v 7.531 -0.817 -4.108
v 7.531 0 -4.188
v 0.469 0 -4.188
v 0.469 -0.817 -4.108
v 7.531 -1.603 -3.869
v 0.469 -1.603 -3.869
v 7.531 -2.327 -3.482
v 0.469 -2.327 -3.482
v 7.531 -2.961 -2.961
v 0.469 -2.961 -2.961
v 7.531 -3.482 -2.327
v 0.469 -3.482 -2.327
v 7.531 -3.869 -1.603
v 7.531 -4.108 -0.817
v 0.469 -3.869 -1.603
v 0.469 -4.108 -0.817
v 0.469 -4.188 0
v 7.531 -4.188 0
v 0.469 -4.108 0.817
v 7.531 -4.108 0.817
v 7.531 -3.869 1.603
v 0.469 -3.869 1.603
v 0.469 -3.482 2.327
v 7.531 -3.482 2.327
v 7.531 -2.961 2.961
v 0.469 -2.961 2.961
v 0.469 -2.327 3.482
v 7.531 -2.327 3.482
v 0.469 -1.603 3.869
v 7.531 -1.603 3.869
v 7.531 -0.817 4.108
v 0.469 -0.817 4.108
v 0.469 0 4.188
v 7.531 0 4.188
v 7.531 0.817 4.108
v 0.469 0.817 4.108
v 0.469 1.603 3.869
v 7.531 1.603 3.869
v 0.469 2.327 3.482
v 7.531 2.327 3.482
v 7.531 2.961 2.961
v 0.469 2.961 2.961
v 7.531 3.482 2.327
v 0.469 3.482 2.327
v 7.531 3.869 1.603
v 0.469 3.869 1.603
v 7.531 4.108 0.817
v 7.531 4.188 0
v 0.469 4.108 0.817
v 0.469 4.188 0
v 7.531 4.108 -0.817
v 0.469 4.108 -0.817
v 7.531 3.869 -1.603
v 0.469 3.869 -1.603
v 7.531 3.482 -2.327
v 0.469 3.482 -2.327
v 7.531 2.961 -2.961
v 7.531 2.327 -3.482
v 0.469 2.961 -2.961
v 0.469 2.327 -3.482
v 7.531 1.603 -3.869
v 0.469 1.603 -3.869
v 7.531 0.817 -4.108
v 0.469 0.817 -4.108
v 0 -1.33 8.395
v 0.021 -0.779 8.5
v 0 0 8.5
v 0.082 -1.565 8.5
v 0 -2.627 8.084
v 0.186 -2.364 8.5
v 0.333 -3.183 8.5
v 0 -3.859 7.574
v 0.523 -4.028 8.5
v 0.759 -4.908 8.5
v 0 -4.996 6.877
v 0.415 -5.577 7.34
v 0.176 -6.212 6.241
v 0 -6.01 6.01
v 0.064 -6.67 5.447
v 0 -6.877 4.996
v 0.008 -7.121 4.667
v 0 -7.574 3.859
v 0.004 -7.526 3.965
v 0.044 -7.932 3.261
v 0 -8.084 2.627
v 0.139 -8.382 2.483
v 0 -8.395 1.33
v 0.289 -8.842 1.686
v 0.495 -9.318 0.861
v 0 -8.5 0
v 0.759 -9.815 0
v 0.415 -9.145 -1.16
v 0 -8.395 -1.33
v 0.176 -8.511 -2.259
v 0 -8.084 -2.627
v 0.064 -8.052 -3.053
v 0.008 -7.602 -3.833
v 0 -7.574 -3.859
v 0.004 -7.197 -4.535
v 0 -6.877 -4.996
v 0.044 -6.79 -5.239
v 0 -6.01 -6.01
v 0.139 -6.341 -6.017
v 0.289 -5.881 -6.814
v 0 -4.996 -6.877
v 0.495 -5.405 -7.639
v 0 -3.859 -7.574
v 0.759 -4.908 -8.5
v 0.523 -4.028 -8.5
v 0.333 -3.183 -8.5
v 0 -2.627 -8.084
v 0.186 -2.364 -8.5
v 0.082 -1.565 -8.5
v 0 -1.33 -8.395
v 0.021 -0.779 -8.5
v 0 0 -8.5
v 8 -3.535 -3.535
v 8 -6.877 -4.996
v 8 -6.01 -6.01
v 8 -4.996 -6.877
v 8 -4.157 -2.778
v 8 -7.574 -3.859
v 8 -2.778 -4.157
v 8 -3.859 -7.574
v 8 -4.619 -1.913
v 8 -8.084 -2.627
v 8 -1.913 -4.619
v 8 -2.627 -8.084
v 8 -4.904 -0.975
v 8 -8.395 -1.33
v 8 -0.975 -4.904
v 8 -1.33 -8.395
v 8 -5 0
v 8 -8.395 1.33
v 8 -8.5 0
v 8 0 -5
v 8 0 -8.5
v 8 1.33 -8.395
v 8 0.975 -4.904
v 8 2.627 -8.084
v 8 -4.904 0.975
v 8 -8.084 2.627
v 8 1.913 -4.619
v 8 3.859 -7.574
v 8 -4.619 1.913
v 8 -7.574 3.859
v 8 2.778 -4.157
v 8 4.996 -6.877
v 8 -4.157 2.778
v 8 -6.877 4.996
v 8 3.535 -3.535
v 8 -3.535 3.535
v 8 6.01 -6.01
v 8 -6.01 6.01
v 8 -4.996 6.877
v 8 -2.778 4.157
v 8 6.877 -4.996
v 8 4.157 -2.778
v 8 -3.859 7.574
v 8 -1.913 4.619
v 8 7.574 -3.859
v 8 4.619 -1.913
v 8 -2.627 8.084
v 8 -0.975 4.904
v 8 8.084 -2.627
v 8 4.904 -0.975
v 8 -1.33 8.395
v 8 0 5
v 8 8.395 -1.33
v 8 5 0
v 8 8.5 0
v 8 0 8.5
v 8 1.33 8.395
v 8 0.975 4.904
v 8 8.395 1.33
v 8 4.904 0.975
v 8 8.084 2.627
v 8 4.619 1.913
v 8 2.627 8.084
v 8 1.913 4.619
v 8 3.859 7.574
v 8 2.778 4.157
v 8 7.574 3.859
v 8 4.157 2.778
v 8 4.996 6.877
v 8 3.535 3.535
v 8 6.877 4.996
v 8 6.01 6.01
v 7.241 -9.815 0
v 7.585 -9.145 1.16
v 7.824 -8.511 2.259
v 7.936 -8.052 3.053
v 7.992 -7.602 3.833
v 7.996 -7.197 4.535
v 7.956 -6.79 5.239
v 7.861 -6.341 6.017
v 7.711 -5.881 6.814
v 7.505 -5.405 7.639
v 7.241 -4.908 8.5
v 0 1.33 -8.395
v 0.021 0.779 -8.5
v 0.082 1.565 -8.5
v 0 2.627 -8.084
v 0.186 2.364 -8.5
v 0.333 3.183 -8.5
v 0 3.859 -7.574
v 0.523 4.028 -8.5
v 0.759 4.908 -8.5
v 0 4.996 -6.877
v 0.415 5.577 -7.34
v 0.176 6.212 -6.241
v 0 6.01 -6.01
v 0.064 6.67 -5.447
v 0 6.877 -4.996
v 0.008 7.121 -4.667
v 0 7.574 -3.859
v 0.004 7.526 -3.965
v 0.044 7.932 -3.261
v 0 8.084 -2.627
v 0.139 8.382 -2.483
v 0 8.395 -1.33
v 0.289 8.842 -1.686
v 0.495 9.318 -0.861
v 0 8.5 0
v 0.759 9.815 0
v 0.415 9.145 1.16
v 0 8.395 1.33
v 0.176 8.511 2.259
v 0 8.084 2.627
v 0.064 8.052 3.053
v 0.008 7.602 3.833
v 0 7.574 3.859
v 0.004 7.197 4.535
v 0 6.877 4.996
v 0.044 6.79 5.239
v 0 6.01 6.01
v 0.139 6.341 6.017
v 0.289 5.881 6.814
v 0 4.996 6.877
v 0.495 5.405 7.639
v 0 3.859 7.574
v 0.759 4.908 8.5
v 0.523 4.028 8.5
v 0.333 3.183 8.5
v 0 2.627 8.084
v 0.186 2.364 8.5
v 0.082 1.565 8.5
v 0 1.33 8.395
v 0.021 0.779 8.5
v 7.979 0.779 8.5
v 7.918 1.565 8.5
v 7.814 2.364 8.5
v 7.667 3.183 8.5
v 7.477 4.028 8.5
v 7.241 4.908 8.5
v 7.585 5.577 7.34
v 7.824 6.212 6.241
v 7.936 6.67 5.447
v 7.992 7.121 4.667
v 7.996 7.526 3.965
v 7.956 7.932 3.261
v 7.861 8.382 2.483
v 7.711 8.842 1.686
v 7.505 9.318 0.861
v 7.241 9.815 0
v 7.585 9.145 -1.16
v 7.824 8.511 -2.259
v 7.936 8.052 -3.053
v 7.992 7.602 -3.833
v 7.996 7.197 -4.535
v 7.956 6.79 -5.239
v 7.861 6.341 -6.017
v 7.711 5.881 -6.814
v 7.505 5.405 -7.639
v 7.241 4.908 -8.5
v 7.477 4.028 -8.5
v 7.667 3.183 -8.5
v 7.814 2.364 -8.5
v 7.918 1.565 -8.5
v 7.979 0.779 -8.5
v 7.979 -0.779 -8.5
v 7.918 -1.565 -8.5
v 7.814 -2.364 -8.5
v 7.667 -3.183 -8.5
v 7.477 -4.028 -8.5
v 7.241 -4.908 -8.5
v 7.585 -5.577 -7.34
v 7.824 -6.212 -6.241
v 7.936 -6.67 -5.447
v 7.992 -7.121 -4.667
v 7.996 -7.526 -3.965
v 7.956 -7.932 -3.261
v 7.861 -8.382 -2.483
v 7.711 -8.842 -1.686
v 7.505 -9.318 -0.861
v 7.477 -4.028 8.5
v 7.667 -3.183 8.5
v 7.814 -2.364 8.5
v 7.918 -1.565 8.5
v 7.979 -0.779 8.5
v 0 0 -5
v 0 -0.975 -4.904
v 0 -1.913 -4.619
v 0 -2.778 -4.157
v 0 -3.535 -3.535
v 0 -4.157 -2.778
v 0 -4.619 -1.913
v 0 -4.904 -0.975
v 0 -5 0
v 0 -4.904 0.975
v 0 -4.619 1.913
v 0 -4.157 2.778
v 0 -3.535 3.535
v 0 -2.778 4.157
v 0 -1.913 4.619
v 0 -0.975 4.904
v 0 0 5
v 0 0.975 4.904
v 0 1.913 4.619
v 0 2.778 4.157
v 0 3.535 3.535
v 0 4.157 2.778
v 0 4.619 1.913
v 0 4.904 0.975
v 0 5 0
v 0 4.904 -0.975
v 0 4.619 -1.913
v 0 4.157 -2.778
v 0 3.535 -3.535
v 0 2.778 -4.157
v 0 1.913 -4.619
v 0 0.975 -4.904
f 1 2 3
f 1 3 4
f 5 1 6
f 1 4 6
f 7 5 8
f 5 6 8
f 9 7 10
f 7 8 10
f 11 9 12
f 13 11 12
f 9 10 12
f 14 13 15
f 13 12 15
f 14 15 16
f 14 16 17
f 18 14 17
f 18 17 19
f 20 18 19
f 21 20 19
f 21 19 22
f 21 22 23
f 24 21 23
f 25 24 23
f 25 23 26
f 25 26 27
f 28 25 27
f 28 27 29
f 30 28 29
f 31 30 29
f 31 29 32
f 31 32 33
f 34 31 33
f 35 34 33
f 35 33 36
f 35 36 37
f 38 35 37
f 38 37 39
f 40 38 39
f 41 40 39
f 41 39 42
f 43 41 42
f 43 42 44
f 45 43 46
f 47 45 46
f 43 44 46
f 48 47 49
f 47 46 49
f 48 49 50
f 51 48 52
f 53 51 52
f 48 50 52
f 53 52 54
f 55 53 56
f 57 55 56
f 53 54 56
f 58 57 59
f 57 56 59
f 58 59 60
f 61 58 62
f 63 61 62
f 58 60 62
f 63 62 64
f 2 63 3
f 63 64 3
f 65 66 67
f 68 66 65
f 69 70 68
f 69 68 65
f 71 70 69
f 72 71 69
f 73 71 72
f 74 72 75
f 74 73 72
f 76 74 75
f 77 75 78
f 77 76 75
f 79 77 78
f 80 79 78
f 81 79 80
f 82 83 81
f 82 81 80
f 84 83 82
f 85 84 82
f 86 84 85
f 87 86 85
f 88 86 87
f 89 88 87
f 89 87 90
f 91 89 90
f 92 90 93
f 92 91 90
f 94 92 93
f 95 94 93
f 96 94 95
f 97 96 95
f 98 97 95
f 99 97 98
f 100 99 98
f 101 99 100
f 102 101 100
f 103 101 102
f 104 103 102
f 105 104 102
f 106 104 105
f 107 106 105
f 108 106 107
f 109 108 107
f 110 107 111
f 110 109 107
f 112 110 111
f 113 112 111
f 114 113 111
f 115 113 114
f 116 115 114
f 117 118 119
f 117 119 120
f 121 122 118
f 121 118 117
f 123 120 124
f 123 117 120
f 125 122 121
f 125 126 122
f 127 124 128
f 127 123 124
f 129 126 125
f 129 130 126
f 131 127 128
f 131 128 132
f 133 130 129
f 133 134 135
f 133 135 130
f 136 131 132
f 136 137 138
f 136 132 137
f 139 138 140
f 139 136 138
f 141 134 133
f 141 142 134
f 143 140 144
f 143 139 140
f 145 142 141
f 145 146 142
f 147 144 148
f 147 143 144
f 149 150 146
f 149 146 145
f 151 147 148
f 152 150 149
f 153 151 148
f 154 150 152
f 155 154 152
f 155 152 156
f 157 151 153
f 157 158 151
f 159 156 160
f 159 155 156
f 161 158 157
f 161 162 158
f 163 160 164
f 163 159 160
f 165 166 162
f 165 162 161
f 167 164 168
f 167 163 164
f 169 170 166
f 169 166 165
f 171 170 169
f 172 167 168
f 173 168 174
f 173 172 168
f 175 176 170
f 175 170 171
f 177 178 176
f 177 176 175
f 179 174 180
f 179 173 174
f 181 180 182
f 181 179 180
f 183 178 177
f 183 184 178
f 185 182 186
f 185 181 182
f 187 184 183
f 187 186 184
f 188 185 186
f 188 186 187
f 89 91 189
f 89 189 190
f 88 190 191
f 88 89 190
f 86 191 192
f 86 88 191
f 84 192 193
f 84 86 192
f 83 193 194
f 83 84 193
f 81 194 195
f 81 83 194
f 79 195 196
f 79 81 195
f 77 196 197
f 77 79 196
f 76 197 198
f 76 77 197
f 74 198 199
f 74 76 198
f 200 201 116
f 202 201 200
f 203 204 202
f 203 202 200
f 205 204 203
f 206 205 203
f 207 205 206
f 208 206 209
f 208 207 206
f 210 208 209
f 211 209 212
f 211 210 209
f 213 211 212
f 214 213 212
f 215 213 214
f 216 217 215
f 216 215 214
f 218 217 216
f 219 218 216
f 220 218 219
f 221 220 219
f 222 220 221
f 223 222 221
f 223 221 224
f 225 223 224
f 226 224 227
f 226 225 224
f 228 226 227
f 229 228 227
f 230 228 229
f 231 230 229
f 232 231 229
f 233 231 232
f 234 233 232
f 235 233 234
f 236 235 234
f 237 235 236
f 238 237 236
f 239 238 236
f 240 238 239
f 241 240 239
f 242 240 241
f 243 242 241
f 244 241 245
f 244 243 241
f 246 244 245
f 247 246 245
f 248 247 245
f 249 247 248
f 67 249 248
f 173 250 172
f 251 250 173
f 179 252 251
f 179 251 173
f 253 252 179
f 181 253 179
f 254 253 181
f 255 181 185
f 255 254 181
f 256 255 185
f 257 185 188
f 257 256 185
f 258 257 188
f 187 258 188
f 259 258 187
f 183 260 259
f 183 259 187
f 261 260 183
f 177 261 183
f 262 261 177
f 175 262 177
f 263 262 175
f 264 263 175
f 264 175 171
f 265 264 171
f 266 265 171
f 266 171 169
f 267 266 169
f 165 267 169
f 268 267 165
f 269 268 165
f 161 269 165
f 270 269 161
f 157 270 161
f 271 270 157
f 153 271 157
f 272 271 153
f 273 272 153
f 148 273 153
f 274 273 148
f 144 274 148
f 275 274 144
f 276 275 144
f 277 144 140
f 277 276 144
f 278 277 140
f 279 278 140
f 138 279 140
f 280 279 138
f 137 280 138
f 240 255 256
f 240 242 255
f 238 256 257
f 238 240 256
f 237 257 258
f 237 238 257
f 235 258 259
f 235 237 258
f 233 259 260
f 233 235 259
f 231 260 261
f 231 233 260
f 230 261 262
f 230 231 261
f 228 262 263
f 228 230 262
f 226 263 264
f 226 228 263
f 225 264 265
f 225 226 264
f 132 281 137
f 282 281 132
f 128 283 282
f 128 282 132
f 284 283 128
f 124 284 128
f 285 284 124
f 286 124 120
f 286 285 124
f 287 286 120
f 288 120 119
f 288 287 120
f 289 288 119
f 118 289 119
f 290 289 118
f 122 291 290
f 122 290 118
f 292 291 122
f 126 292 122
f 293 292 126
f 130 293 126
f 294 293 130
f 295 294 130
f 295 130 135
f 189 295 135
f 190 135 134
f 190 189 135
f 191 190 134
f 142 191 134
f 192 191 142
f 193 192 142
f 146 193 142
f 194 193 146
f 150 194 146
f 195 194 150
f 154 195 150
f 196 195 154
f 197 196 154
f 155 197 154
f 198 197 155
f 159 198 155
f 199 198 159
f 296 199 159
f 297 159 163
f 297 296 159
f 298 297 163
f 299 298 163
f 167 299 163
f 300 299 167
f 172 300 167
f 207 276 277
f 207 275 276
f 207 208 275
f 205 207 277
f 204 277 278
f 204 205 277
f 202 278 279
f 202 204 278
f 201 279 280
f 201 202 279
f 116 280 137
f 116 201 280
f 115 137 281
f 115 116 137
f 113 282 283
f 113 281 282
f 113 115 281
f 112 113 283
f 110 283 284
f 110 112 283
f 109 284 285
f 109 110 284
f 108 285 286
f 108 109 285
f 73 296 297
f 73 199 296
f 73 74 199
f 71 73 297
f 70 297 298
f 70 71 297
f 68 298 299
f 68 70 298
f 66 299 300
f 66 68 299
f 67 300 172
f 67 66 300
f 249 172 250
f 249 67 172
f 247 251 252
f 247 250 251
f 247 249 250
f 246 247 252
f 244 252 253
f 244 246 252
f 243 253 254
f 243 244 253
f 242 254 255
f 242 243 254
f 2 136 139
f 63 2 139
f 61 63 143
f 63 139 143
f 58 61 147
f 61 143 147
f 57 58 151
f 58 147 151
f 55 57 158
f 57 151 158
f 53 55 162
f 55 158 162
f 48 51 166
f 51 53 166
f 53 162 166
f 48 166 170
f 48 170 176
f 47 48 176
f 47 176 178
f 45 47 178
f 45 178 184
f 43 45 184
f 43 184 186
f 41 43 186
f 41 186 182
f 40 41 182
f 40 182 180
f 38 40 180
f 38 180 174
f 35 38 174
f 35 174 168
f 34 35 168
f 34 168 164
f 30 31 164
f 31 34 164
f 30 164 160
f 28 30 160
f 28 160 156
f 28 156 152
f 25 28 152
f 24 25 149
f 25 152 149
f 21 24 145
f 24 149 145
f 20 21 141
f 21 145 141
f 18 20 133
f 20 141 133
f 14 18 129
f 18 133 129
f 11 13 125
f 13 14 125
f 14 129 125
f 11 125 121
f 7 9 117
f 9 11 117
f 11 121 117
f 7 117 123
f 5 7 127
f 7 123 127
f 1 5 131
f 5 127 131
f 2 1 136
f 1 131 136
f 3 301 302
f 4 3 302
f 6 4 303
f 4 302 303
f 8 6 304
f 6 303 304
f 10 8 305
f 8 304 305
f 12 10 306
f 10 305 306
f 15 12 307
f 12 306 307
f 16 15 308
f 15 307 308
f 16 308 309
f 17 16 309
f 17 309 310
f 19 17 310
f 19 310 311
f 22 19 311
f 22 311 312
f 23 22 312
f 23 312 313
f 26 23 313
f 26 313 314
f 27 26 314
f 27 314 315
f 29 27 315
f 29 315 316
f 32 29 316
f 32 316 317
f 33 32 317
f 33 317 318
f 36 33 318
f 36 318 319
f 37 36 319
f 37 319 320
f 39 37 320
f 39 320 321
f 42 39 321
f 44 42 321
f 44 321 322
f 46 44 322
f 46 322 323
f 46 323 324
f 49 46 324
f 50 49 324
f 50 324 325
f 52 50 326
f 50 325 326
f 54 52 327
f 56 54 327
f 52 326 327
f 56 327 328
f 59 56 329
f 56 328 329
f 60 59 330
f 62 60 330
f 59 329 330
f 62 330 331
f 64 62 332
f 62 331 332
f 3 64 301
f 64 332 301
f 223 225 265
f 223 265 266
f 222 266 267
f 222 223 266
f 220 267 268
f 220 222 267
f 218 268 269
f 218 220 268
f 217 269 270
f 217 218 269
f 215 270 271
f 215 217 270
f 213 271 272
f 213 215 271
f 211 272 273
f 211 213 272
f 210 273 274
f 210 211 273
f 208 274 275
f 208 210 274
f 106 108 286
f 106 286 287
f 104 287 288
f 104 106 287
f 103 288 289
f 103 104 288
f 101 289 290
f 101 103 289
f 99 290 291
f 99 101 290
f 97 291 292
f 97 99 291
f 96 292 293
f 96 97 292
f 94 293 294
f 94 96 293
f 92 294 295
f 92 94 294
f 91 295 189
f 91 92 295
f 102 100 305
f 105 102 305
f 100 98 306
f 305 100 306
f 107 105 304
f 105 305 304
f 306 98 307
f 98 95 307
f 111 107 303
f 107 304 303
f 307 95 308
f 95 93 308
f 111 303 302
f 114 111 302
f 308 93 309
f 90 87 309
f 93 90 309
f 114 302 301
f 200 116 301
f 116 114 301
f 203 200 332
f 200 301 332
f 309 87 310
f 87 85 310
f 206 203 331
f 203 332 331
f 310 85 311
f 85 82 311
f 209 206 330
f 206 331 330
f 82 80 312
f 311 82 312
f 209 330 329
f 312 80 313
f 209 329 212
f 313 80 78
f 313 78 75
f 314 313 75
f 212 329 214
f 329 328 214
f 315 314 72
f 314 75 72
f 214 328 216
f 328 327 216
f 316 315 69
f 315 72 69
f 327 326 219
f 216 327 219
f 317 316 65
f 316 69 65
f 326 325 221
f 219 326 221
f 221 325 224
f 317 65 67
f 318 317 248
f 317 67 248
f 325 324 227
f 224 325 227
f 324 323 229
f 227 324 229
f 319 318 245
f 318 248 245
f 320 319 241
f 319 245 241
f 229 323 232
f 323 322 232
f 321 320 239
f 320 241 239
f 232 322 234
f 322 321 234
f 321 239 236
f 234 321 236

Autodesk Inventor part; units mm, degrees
ref_plane "YZ Plane" through (0, 0, 0) normal (1, 0, 0) x (0, 1, 0)
ref_plane "XZ Plane" through (0, 0, 0) normal (0, 1, 0) x (-1, 0, 0)
sketch "Эскиз1" plane through (0, 0, 0) normal (1, 0, 0) x (0, 1, 0)
  line L0 (-9.815, 0) -> (-4.9075, 8.5)
  line L1 (-4.9075, 8.5) -> (4.9075, 8.5)
  line L2 (4.9075, 8.5) -> (9.815, 0)
  line L3 (9.815, 0) -> (4.9075, -8.5)
  line L4 (4.9075, -8.5) -> (-4.9075, -8.5)
  line L5 (-4.9075, -8.5) -> (-9.815, 0)
  point P0 (0, 0)
  point P1 (0, 0)
  dimension "d0" = 19.6299
extrude "Базовый элемент" add sketch "Эскиз1" along normal blind 8
sketch "Эскиз2" plane through (0, 0, 0) normal (0, 0, 1) x (1, 0, 0)
  line L0 (0, 4.9075) -> (0, 9.815) projected
  line L1 (0, 9.815) -> (8, 9.815) projected
  line L2 (8, 4.9075) -> (8, 9.815) projected
  line L3 (-1.6, 0) -> (9.6, 0) projected
  line L4 (0.7592, 9.815) -> (0, 8.5)
  line L5 (7.2408, 9.815) -> (8, 8.5)
  dimension "d3" = 30
  dimension "d4" = 30
  dimension "d5" = 17
  dimension "d6" = 17
revolve "Фаска1" cut sketch "Эскиз2" angle 360 about axis through (-10, 0, 0) along (1, 0, 0)
sketch "Эскиз3" plane through (8, 0, 0) normal (1, 0, 0) x (0, 0, -1)
  arc A0 (-4.25, -7.3612) -> (4.25, -7.3612) centre (0, 0) ccw projected
hole "Резьба" at (8, 0, 0) direction (-1, 0, 0) diameter 8.376 end through all thread size "M10x1.5" class "6H" standard "ISO Metric profile"
chamfer "Фаска2" distance 0.8119 angle 30 1 edges at (8, 0, 4.188) measured on face at (8, 7.0214, -0.1683)
chamfer "Фаска3" distance 0.8119 angle 30 1 edges at (0, 0, 4.188) measured on face at (0, 7.0214, -0.1683)
ref_plane "Work Plane1" through (-19.1723, 0, 0) normal (0, -0.866, -0.5) x (1, 0, 0)
equation "\"d0\" = 1.1547 * SW"
equation "\"d1\" = KOH"
equation "\"d3\" = ANG1"
equation "\"d4\" = ANG2"
equation "\"d5\" = SW0"
equation "\"d6\" = SW01"
equation "\"d8\" = -0.5 * GD1 + 0.5 * NND"
equation "\"d40\" = -0.5 * GD1 + 0.5 * NND"
equation "\"d10\" = -0.5 * GD1 + 0.5 * NND"
equation "\"d41\" = -0.5 * GD1 + 0.5 * NND"
equation "\"ANG1\" = 30deg"
equation "\"ANG2\" = 30deg"
equation "\"KOH\" = 8"
equation "\"SW\" = 17"
equation "\"SW0\" = 17"
equation "\"SW01\" = SW0"
equation "\"GUL\" = 0.541266 * PTC"
equation "\"LADI\" = 16.15"
equation "\"TOA\" = 30deg"
equation "\"FAWI\" = 30deg"
equation "\"PTC\" = 1.5"
equation "\"E0\" = 1.155 * SW"
equation "\"GAL\" = 0.541266 * PTC"
equation "\"GD1\" = 8.376202"
equation "\"NND\" = 10"
properties part number "Гайка M10-6H ГОСТ 5927-70" material "Сталь, мягкая"
